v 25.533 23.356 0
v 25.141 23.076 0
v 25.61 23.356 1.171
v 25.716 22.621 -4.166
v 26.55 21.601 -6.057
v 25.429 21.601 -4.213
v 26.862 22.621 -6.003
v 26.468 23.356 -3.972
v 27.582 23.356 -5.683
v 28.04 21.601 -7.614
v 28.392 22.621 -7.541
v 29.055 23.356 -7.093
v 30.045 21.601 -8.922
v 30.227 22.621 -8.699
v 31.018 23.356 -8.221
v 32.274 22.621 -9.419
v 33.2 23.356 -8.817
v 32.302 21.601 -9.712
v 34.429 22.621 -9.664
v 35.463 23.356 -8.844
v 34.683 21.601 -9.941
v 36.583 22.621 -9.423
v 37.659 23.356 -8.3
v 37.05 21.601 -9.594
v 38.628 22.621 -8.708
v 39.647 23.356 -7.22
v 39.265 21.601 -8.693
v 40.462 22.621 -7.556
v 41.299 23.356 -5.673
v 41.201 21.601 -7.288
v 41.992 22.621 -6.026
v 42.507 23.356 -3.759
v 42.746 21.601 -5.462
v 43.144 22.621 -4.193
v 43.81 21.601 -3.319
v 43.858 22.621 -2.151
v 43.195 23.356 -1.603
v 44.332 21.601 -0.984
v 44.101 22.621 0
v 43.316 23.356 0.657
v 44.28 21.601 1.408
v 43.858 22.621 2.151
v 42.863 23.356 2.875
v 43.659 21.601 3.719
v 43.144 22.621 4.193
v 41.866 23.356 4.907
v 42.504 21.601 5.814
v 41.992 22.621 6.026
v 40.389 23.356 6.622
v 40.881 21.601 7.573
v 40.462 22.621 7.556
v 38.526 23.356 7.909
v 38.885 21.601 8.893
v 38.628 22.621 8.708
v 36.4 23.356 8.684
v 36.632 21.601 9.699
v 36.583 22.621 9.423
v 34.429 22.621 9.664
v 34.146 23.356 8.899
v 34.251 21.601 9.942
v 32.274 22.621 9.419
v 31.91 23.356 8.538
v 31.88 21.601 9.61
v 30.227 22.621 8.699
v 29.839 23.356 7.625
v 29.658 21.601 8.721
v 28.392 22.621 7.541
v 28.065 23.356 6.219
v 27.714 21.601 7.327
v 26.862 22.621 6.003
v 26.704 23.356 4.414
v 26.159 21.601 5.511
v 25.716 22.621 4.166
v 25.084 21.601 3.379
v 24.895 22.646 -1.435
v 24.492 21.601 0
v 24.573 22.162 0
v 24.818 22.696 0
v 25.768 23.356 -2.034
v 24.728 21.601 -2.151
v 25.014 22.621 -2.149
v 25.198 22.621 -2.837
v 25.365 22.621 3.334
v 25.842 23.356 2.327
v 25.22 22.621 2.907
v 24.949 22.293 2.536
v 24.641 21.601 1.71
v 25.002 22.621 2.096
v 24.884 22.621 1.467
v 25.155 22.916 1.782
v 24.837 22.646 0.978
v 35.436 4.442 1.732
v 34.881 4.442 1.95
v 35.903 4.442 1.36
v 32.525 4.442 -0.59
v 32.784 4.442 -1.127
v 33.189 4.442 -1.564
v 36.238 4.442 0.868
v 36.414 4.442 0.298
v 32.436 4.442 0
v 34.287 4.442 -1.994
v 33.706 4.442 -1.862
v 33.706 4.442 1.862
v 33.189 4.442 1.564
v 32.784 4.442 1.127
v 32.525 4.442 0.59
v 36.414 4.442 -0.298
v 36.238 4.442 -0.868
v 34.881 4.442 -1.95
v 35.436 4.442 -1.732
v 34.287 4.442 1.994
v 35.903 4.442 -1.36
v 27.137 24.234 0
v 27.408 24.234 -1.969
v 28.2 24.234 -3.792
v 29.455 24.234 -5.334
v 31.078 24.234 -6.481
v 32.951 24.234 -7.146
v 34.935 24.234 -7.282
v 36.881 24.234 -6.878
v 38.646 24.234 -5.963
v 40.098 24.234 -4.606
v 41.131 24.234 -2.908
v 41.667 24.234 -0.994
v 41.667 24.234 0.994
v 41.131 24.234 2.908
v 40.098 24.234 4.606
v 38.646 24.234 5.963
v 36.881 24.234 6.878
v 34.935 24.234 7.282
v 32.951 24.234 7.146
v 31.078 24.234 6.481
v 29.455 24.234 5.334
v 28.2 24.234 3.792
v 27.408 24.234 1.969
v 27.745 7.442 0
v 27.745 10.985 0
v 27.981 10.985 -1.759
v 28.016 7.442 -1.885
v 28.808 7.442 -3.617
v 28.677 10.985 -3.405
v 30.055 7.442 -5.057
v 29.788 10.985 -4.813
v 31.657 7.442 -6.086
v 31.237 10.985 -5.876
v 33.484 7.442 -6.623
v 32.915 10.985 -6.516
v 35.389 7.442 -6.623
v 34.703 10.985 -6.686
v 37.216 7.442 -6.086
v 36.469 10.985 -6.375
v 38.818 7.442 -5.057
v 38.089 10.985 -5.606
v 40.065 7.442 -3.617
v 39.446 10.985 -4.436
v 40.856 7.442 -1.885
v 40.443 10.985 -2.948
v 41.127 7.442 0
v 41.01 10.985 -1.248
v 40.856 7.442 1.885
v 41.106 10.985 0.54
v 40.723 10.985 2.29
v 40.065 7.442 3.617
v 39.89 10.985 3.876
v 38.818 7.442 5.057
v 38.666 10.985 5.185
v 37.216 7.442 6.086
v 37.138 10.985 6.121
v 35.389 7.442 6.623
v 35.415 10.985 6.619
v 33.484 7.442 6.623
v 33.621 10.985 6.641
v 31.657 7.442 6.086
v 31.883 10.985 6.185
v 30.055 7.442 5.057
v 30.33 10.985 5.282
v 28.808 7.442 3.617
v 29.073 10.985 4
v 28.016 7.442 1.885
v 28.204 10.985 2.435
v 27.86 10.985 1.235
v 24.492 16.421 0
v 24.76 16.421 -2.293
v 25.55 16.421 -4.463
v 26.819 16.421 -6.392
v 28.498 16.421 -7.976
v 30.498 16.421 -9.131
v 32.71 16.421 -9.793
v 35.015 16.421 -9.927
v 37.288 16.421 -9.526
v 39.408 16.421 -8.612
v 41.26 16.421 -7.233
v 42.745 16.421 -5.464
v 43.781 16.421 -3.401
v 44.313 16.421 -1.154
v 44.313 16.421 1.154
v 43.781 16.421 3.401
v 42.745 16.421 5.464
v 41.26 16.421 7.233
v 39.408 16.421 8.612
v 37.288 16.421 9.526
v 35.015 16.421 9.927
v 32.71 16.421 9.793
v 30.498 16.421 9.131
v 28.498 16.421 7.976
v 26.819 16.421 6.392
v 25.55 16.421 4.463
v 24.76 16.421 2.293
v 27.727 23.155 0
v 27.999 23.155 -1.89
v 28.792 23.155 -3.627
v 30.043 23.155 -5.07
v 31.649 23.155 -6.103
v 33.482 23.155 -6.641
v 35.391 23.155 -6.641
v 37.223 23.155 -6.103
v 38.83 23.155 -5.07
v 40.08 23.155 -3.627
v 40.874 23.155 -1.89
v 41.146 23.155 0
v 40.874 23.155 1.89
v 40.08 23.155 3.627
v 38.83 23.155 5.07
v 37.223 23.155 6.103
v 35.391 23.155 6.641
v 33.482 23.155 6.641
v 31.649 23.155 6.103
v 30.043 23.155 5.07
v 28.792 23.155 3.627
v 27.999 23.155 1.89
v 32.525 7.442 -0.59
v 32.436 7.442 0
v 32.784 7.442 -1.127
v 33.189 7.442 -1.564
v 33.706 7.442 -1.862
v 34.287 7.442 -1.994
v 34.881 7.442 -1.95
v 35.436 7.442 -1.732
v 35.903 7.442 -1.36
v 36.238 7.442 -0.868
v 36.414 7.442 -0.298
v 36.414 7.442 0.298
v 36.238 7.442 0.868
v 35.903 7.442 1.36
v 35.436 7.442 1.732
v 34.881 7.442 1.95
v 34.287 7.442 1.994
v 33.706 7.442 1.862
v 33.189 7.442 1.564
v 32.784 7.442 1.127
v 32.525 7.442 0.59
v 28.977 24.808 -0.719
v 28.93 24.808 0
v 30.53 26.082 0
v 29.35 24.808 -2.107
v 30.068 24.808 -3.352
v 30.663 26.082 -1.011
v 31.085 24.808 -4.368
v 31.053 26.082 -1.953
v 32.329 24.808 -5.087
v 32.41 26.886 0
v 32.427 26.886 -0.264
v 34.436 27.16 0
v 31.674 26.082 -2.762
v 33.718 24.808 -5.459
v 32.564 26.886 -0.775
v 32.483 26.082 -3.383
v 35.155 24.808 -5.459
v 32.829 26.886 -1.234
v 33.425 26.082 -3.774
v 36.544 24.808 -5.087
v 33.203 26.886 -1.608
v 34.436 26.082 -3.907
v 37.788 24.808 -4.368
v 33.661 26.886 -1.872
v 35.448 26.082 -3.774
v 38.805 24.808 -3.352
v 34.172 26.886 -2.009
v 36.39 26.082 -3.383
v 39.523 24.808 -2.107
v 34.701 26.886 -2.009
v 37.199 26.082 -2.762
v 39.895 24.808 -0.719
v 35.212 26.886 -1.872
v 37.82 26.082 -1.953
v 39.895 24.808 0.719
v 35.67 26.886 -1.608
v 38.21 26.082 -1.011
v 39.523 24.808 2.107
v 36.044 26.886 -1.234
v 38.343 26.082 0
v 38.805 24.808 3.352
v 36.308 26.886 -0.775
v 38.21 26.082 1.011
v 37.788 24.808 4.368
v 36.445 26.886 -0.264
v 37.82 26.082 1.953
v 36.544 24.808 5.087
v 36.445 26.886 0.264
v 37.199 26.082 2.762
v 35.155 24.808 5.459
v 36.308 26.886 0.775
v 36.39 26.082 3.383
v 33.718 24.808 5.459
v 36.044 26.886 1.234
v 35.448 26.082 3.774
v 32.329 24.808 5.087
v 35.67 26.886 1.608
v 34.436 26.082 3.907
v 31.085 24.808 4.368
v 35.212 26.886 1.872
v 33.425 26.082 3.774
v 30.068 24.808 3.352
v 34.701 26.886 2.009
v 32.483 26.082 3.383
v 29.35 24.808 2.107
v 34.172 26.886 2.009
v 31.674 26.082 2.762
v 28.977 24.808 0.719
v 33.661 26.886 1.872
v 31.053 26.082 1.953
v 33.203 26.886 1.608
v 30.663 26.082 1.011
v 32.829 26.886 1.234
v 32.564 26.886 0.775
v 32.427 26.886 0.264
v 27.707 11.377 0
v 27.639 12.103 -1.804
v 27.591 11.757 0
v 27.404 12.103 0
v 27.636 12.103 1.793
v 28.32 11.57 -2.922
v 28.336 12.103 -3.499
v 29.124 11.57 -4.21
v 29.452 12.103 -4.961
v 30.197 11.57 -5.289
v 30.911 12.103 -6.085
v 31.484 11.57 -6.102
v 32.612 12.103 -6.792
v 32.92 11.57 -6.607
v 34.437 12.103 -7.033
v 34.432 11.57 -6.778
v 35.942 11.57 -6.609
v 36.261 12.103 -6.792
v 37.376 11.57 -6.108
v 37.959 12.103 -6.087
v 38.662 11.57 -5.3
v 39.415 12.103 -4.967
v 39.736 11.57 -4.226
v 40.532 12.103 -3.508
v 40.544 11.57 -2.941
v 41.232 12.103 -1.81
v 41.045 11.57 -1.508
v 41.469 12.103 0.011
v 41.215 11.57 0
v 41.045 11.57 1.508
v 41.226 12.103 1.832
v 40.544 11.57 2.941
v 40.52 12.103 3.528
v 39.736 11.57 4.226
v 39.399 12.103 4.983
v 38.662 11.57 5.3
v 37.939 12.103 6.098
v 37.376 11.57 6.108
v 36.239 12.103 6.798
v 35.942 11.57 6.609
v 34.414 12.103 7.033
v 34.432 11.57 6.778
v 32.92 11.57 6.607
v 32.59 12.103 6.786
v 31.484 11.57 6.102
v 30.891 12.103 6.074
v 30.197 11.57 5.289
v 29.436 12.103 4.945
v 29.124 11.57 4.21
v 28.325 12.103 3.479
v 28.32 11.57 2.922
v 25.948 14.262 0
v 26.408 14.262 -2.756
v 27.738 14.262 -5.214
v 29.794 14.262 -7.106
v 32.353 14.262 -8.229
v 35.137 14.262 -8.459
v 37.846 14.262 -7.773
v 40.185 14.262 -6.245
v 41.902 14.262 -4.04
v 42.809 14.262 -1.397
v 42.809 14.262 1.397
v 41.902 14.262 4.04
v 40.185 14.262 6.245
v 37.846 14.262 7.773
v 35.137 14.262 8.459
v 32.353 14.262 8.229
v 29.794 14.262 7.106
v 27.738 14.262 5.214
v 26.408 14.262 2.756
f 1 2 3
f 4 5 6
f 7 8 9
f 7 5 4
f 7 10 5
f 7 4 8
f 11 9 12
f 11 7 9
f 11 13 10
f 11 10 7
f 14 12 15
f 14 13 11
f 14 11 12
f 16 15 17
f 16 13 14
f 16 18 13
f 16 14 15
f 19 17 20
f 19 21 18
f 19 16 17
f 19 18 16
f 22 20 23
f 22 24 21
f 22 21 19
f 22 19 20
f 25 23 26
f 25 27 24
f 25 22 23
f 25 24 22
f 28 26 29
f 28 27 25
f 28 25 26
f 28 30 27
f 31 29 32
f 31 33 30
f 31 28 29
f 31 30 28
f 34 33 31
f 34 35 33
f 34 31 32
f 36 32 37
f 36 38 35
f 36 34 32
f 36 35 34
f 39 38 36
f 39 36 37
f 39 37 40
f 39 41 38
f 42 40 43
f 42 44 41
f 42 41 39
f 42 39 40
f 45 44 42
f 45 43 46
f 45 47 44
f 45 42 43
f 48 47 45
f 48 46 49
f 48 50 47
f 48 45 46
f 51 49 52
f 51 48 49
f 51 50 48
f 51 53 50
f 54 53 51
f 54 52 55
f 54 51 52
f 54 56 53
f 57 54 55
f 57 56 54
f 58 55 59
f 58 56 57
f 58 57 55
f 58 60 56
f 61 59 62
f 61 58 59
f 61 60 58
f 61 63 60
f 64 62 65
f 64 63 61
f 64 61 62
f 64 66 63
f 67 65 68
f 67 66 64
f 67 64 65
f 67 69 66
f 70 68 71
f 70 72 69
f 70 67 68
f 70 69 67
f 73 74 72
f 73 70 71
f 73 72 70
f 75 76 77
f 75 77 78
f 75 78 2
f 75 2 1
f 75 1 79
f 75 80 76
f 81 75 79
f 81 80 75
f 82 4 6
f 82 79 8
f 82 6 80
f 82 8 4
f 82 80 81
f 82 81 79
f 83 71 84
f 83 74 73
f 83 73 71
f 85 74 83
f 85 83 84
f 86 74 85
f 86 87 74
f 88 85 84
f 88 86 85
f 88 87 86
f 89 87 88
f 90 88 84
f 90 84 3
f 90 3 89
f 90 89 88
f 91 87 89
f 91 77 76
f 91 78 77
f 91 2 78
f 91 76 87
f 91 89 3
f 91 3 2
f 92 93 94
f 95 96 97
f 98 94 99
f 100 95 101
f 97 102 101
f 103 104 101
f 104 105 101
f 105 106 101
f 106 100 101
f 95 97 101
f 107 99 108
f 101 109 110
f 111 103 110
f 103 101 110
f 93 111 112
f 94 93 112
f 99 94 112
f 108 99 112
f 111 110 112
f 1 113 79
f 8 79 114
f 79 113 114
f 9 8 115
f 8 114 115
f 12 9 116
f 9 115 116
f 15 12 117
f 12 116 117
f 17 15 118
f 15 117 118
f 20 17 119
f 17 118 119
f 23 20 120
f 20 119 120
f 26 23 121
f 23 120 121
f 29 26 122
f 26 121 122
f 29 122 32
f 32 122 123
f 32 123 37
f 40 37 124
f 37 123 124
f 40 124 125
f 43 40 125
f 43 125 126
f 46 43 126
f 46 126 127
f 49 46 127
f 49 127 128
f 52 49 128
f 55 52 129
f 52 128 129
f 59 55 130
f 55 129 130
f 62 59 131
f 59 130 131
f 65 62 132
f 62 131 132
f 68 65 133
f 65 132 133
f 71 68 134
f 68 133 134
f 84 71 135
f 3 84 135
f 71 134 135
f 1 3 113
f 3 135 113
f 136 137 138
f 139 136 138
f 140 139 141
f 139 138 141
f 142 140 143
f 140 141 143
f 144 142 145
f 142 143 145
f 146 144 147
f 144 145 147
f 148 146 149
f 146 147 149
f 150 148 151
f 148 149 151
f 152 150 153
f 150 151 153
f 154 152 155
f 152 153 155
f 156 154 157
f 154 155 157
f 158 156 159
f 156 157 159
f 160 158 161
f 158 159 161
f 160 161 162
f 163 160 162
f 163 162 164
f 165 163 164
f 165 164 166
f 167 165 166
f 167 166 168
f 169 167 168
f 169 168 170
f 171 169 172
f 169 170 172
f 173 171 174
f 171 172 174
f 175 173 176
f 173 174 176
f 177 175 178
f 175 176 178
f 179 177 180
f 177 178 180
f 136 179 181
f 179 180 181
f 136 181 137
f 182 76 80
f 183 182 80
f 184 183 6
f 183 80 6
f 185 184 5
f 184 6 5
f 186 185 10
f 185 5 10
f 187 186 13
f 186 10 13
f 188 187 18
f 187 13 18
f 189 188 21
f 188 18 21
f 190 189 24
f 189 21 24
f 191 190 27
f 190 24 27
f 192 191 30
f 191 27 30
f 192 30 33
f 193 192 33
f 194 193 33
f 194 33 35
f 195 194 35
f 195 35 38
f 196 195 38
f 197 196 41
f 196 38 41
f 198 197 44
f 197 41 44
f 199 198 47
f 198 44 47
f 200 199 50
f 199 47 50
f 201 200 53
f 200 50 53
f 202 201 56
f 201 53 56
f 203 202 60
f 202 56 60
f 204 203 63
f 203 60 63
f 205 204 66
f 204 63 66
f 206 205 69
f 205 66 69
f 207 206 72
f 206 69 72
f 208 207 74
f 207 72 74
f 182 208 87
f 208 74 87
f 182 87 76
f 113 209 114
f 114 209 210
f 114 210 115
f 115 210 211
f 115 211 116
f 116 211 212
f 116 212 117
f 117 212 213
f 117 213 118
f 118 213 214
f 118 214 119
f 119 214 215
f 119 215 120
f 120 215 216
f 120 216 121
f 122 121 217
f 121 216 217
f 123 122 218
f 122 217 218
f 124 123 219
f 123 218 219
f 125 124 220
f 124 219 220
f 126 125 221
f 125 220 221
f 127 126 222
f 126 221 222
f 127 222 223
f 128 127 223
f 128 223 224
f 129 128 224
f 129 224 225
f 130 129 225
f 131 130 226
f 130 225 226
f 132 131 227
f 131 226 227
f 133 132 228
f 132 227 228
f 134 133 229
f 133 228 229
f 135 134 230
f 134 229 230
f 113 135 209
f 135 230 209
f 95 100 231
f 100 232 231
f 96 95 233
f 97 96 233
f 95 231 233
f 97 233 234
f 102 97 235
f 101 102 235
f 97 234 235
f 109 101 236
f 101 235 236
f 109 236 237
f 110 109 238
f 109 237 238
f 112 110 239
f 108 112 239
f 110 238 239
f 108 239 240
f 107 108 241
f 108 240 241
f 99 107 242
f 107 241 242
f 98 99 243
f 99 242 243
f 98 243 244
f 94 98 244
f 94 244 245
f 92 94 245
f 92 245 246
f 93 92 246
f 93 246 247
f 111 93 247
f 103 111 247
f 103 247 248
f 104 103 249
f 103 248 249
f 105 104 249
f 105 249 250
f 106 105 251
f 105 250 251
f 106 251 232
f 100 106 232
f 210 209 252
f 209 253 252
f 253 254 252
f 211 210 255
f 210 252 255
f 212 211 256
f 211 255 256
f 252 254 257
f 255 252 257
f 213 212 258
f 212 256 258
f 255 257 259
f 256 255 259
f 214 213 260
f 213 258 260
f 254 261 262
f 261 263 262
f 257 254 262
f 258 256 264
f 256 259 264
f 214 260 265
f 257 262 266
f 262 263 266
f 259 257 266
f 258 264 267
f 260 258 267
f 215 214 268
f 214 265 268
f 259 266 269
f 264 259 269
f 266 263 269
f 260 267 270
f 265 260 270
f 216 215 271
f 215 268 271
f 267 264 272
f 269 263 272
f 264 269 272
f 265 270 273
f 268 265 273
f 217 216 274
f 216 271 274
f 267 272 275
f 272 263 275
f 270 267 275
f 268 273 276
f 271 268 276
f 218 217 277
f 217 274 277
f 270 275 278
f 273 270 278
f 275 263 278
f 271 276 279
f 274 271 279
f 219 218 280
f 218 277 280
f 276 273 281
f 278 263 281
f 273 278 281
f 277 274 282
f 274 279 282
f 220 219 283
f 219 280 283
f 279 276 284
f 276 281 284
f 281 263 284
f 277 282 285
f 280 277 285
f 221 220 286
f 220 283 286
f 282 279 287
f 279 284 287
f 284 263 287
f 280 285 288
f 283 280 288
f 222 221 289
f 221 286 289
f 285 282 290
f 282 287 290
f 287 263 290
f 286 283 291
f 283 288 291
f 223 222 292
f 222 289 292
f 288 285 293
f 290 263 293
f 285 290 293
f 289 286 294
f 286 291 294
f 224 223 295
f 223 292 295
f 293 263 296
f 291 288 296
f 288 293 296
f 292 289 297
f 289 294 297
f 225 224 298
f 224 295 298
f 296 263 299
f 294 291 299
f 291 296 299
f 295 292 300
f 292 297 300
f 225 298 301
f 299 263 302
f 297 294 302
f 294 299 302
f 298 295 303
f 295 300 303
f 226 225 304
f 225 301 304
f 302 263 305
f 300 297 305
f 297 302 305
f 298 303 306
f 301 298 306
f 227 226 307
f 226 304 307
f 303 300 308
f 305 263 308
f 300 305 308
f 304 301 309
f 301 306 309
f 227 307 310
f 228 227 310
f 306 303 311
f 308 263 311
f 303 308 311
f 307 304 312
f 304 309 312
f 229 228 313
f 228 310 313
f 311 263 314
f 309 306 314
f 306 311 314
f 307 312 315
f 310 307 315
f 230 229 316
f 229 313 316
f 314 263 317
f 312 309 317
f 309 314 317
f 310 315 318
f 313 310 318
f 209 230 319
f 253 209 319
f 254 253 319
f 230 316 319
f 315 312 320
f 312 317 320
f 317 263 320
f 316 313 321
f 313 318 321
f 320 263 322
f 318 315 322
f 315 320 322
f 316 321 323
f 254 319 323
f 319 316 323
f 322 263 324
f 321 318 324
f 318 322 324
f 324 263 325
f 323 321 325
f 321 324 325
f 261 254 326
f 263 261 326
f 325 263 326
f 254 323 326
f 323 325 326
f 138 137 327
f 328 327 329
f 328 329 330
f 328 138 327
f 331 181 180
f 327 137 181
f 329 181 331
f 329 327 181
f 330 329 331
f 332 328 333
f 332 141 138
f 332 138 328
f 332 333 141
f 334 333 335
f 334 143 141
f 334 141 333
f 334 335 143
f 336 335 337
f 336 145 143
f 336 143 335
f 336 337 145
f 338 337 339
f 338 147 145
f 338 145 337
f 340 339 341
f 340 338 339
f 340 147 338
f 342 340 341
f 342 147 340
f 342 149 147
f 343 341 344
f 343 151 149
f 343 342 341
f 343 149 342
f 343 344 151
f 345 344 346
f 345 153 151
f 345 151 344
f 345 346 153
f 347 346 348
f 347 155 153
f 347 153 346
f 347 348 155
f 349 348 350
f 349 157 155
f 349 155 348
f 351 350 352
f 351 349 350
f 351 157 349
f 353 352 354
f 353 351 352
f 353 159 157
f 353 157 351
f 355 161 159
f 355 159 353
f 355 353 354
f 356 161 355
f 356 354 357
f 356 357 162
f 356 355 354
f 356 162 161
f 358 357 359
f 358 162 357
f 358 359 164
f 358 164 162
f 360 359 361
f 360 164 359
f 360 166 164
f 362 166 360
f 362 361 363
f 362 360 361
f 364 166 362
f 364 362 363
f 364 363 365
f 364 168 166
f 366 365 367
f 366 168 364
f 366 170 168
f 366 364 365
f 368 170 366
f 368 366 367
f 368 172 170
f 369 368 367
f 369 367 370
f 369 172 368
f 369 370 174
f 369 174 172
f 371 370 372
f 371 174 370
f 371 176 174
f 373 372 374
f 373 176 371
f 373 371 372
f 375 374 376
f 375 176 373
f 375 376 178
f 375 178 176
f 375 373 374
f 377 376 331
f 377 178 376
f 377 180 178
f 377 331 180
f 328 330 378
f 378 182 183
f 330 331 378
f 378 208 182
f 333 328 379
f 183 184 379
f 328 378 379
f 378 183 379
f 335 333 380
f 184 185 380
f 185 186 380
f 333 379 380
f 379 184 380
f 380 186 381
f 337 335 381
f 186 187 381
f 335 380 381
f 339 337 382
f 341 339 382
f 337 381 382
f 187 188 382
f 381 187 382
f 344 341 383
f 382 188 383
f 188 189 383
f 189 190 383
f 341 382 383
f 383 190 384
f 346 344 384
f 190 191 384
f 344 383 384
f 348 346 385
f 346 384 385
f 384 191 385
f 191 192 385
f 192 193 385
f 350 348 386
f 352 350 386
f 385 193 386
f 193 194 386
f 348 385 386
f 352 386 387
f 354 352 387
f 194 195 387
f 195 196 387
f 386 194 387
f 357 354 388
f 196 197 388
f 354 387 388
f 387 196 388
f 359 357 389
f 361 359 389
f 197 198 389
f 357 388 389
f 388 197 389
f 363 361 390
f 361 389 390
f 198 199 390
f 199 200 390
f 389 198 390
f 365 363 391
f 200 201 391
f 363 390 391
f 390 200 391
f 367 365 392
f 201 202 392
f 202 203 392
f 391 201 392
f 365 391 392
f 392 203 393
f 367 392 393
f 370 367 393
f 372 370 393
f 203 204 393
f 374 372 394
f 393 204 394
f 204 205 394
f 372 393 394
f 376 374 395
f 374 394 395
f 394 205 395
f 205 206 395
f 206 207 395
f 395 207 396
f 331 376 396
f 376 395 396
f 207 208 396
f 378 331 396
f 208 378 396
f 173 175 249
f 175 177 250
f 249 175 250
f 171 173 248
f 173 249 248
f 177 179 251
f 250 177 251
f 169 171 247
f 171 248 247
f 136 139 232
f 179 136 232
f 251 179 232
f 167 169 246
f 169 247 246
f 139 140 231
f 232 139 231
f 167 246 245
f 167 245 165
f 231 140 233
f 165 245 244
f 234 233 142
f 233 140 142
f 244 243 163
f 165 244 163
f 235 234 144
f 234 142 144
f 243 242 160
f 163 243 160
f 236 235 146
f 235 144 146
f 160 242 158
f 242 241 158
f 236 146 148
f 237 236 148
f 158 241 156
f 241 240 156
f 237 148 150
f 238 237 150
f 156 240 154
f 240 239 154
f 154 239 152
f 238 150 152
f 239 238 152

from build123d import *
from build123d.topology import SkipClean

# Parameters (mm, degrees)
FILLET_1_R = 2


with BuildPart() as part:
    # ｽｹｯﾁ1 → 回転1 (revolve)
    with SkipClean():  # the faces are left unmerged after this step: merging them gives an invalid solid
        with BuildSketch(Plane.XY, mode=Mode.PRIVATE) as revolve_1_sk:
            with BuildLine():
                ThreePointArc((41.145537471, 23.155045442), (38.343164799, 26.082487024), (34.436430544, 27.159814398))
                Line((34.436430544, 27.159814398), (34.436430544, 11.915416826))
                ThreePointArc((34.436430544, 11.915416826), (39.826138993, 14.147907163), (42.05862933, 19.537615612))
                ThreePointArc((42.05862933, 19.537615612), (41.826831785, 21.403060285), (41.145537471, 23.155045442))
            make_face()
            with BuildLine():
                Line((34.436430544, 11.915416826), (34.436430544, 27.159814398))
                ThreePointArc((34.436430544, 27.159814398), (26.814231757, 19.537615612), (34.436430544, 11.915416826))
            make_face()
            with BuildLine():
                ThreePointArc((42.05862933, 19.537615612), (39.826138993, 14.147907163), (34.436430544, 11.915416826))
                Line((34.436430544, 11.915416826), (34.436430544, 7.442165664))
                Line((34.436430544, 7.442165664), (34.436430544, 4.442165664))
                Line((34.436430544, 4.442165664), (36.436430544, 4.442165664))
                Line((36.436430544, 4.442165664), (36.436430544, 7.442165664))
                Line((36.436430544, 7.442165664), (41.127456758, 7.442165664))
                Line((41.127456758, 7.442165664), (41.127456758, 11.596223188))
                Line((41.127456758, 11.596223188), (44.380435509, 16.421475002))
                Line((44.380435509, 16.421475002), (44.380435509, 22.787256507))
                Line((44.380435509, 22.787256507), (41.735375917, 24.233678208))
                Line((41.735375917, 24.233678208), (41.145537471, 23.155045442))
                ThreePointArc((41.145537471, 23.155045442), (41.826831785, 21.403060285), (42.05862933, 19.537615612))
            make_face()
        revolve(revolve_1_sk.sketch.rotate(Axis((34.436430544, 27.159814398, 0), (0, -1, 0)), 180), axis=Axis((34.436430544, 27.159814398, 0), (0, -1, 0)))

    # ﾌｨﾚｯﾄ1
    fillet_1_edges = [part.edges().sort_by_distance(p)[0] for p in [
        (44.380435509, 22.787256507, 0),
        (41.127456758, 11.596223188, 0),
    ]]
    fillet(fillet_1_edges, radius=FILLET_1_R)


solid = part.part
